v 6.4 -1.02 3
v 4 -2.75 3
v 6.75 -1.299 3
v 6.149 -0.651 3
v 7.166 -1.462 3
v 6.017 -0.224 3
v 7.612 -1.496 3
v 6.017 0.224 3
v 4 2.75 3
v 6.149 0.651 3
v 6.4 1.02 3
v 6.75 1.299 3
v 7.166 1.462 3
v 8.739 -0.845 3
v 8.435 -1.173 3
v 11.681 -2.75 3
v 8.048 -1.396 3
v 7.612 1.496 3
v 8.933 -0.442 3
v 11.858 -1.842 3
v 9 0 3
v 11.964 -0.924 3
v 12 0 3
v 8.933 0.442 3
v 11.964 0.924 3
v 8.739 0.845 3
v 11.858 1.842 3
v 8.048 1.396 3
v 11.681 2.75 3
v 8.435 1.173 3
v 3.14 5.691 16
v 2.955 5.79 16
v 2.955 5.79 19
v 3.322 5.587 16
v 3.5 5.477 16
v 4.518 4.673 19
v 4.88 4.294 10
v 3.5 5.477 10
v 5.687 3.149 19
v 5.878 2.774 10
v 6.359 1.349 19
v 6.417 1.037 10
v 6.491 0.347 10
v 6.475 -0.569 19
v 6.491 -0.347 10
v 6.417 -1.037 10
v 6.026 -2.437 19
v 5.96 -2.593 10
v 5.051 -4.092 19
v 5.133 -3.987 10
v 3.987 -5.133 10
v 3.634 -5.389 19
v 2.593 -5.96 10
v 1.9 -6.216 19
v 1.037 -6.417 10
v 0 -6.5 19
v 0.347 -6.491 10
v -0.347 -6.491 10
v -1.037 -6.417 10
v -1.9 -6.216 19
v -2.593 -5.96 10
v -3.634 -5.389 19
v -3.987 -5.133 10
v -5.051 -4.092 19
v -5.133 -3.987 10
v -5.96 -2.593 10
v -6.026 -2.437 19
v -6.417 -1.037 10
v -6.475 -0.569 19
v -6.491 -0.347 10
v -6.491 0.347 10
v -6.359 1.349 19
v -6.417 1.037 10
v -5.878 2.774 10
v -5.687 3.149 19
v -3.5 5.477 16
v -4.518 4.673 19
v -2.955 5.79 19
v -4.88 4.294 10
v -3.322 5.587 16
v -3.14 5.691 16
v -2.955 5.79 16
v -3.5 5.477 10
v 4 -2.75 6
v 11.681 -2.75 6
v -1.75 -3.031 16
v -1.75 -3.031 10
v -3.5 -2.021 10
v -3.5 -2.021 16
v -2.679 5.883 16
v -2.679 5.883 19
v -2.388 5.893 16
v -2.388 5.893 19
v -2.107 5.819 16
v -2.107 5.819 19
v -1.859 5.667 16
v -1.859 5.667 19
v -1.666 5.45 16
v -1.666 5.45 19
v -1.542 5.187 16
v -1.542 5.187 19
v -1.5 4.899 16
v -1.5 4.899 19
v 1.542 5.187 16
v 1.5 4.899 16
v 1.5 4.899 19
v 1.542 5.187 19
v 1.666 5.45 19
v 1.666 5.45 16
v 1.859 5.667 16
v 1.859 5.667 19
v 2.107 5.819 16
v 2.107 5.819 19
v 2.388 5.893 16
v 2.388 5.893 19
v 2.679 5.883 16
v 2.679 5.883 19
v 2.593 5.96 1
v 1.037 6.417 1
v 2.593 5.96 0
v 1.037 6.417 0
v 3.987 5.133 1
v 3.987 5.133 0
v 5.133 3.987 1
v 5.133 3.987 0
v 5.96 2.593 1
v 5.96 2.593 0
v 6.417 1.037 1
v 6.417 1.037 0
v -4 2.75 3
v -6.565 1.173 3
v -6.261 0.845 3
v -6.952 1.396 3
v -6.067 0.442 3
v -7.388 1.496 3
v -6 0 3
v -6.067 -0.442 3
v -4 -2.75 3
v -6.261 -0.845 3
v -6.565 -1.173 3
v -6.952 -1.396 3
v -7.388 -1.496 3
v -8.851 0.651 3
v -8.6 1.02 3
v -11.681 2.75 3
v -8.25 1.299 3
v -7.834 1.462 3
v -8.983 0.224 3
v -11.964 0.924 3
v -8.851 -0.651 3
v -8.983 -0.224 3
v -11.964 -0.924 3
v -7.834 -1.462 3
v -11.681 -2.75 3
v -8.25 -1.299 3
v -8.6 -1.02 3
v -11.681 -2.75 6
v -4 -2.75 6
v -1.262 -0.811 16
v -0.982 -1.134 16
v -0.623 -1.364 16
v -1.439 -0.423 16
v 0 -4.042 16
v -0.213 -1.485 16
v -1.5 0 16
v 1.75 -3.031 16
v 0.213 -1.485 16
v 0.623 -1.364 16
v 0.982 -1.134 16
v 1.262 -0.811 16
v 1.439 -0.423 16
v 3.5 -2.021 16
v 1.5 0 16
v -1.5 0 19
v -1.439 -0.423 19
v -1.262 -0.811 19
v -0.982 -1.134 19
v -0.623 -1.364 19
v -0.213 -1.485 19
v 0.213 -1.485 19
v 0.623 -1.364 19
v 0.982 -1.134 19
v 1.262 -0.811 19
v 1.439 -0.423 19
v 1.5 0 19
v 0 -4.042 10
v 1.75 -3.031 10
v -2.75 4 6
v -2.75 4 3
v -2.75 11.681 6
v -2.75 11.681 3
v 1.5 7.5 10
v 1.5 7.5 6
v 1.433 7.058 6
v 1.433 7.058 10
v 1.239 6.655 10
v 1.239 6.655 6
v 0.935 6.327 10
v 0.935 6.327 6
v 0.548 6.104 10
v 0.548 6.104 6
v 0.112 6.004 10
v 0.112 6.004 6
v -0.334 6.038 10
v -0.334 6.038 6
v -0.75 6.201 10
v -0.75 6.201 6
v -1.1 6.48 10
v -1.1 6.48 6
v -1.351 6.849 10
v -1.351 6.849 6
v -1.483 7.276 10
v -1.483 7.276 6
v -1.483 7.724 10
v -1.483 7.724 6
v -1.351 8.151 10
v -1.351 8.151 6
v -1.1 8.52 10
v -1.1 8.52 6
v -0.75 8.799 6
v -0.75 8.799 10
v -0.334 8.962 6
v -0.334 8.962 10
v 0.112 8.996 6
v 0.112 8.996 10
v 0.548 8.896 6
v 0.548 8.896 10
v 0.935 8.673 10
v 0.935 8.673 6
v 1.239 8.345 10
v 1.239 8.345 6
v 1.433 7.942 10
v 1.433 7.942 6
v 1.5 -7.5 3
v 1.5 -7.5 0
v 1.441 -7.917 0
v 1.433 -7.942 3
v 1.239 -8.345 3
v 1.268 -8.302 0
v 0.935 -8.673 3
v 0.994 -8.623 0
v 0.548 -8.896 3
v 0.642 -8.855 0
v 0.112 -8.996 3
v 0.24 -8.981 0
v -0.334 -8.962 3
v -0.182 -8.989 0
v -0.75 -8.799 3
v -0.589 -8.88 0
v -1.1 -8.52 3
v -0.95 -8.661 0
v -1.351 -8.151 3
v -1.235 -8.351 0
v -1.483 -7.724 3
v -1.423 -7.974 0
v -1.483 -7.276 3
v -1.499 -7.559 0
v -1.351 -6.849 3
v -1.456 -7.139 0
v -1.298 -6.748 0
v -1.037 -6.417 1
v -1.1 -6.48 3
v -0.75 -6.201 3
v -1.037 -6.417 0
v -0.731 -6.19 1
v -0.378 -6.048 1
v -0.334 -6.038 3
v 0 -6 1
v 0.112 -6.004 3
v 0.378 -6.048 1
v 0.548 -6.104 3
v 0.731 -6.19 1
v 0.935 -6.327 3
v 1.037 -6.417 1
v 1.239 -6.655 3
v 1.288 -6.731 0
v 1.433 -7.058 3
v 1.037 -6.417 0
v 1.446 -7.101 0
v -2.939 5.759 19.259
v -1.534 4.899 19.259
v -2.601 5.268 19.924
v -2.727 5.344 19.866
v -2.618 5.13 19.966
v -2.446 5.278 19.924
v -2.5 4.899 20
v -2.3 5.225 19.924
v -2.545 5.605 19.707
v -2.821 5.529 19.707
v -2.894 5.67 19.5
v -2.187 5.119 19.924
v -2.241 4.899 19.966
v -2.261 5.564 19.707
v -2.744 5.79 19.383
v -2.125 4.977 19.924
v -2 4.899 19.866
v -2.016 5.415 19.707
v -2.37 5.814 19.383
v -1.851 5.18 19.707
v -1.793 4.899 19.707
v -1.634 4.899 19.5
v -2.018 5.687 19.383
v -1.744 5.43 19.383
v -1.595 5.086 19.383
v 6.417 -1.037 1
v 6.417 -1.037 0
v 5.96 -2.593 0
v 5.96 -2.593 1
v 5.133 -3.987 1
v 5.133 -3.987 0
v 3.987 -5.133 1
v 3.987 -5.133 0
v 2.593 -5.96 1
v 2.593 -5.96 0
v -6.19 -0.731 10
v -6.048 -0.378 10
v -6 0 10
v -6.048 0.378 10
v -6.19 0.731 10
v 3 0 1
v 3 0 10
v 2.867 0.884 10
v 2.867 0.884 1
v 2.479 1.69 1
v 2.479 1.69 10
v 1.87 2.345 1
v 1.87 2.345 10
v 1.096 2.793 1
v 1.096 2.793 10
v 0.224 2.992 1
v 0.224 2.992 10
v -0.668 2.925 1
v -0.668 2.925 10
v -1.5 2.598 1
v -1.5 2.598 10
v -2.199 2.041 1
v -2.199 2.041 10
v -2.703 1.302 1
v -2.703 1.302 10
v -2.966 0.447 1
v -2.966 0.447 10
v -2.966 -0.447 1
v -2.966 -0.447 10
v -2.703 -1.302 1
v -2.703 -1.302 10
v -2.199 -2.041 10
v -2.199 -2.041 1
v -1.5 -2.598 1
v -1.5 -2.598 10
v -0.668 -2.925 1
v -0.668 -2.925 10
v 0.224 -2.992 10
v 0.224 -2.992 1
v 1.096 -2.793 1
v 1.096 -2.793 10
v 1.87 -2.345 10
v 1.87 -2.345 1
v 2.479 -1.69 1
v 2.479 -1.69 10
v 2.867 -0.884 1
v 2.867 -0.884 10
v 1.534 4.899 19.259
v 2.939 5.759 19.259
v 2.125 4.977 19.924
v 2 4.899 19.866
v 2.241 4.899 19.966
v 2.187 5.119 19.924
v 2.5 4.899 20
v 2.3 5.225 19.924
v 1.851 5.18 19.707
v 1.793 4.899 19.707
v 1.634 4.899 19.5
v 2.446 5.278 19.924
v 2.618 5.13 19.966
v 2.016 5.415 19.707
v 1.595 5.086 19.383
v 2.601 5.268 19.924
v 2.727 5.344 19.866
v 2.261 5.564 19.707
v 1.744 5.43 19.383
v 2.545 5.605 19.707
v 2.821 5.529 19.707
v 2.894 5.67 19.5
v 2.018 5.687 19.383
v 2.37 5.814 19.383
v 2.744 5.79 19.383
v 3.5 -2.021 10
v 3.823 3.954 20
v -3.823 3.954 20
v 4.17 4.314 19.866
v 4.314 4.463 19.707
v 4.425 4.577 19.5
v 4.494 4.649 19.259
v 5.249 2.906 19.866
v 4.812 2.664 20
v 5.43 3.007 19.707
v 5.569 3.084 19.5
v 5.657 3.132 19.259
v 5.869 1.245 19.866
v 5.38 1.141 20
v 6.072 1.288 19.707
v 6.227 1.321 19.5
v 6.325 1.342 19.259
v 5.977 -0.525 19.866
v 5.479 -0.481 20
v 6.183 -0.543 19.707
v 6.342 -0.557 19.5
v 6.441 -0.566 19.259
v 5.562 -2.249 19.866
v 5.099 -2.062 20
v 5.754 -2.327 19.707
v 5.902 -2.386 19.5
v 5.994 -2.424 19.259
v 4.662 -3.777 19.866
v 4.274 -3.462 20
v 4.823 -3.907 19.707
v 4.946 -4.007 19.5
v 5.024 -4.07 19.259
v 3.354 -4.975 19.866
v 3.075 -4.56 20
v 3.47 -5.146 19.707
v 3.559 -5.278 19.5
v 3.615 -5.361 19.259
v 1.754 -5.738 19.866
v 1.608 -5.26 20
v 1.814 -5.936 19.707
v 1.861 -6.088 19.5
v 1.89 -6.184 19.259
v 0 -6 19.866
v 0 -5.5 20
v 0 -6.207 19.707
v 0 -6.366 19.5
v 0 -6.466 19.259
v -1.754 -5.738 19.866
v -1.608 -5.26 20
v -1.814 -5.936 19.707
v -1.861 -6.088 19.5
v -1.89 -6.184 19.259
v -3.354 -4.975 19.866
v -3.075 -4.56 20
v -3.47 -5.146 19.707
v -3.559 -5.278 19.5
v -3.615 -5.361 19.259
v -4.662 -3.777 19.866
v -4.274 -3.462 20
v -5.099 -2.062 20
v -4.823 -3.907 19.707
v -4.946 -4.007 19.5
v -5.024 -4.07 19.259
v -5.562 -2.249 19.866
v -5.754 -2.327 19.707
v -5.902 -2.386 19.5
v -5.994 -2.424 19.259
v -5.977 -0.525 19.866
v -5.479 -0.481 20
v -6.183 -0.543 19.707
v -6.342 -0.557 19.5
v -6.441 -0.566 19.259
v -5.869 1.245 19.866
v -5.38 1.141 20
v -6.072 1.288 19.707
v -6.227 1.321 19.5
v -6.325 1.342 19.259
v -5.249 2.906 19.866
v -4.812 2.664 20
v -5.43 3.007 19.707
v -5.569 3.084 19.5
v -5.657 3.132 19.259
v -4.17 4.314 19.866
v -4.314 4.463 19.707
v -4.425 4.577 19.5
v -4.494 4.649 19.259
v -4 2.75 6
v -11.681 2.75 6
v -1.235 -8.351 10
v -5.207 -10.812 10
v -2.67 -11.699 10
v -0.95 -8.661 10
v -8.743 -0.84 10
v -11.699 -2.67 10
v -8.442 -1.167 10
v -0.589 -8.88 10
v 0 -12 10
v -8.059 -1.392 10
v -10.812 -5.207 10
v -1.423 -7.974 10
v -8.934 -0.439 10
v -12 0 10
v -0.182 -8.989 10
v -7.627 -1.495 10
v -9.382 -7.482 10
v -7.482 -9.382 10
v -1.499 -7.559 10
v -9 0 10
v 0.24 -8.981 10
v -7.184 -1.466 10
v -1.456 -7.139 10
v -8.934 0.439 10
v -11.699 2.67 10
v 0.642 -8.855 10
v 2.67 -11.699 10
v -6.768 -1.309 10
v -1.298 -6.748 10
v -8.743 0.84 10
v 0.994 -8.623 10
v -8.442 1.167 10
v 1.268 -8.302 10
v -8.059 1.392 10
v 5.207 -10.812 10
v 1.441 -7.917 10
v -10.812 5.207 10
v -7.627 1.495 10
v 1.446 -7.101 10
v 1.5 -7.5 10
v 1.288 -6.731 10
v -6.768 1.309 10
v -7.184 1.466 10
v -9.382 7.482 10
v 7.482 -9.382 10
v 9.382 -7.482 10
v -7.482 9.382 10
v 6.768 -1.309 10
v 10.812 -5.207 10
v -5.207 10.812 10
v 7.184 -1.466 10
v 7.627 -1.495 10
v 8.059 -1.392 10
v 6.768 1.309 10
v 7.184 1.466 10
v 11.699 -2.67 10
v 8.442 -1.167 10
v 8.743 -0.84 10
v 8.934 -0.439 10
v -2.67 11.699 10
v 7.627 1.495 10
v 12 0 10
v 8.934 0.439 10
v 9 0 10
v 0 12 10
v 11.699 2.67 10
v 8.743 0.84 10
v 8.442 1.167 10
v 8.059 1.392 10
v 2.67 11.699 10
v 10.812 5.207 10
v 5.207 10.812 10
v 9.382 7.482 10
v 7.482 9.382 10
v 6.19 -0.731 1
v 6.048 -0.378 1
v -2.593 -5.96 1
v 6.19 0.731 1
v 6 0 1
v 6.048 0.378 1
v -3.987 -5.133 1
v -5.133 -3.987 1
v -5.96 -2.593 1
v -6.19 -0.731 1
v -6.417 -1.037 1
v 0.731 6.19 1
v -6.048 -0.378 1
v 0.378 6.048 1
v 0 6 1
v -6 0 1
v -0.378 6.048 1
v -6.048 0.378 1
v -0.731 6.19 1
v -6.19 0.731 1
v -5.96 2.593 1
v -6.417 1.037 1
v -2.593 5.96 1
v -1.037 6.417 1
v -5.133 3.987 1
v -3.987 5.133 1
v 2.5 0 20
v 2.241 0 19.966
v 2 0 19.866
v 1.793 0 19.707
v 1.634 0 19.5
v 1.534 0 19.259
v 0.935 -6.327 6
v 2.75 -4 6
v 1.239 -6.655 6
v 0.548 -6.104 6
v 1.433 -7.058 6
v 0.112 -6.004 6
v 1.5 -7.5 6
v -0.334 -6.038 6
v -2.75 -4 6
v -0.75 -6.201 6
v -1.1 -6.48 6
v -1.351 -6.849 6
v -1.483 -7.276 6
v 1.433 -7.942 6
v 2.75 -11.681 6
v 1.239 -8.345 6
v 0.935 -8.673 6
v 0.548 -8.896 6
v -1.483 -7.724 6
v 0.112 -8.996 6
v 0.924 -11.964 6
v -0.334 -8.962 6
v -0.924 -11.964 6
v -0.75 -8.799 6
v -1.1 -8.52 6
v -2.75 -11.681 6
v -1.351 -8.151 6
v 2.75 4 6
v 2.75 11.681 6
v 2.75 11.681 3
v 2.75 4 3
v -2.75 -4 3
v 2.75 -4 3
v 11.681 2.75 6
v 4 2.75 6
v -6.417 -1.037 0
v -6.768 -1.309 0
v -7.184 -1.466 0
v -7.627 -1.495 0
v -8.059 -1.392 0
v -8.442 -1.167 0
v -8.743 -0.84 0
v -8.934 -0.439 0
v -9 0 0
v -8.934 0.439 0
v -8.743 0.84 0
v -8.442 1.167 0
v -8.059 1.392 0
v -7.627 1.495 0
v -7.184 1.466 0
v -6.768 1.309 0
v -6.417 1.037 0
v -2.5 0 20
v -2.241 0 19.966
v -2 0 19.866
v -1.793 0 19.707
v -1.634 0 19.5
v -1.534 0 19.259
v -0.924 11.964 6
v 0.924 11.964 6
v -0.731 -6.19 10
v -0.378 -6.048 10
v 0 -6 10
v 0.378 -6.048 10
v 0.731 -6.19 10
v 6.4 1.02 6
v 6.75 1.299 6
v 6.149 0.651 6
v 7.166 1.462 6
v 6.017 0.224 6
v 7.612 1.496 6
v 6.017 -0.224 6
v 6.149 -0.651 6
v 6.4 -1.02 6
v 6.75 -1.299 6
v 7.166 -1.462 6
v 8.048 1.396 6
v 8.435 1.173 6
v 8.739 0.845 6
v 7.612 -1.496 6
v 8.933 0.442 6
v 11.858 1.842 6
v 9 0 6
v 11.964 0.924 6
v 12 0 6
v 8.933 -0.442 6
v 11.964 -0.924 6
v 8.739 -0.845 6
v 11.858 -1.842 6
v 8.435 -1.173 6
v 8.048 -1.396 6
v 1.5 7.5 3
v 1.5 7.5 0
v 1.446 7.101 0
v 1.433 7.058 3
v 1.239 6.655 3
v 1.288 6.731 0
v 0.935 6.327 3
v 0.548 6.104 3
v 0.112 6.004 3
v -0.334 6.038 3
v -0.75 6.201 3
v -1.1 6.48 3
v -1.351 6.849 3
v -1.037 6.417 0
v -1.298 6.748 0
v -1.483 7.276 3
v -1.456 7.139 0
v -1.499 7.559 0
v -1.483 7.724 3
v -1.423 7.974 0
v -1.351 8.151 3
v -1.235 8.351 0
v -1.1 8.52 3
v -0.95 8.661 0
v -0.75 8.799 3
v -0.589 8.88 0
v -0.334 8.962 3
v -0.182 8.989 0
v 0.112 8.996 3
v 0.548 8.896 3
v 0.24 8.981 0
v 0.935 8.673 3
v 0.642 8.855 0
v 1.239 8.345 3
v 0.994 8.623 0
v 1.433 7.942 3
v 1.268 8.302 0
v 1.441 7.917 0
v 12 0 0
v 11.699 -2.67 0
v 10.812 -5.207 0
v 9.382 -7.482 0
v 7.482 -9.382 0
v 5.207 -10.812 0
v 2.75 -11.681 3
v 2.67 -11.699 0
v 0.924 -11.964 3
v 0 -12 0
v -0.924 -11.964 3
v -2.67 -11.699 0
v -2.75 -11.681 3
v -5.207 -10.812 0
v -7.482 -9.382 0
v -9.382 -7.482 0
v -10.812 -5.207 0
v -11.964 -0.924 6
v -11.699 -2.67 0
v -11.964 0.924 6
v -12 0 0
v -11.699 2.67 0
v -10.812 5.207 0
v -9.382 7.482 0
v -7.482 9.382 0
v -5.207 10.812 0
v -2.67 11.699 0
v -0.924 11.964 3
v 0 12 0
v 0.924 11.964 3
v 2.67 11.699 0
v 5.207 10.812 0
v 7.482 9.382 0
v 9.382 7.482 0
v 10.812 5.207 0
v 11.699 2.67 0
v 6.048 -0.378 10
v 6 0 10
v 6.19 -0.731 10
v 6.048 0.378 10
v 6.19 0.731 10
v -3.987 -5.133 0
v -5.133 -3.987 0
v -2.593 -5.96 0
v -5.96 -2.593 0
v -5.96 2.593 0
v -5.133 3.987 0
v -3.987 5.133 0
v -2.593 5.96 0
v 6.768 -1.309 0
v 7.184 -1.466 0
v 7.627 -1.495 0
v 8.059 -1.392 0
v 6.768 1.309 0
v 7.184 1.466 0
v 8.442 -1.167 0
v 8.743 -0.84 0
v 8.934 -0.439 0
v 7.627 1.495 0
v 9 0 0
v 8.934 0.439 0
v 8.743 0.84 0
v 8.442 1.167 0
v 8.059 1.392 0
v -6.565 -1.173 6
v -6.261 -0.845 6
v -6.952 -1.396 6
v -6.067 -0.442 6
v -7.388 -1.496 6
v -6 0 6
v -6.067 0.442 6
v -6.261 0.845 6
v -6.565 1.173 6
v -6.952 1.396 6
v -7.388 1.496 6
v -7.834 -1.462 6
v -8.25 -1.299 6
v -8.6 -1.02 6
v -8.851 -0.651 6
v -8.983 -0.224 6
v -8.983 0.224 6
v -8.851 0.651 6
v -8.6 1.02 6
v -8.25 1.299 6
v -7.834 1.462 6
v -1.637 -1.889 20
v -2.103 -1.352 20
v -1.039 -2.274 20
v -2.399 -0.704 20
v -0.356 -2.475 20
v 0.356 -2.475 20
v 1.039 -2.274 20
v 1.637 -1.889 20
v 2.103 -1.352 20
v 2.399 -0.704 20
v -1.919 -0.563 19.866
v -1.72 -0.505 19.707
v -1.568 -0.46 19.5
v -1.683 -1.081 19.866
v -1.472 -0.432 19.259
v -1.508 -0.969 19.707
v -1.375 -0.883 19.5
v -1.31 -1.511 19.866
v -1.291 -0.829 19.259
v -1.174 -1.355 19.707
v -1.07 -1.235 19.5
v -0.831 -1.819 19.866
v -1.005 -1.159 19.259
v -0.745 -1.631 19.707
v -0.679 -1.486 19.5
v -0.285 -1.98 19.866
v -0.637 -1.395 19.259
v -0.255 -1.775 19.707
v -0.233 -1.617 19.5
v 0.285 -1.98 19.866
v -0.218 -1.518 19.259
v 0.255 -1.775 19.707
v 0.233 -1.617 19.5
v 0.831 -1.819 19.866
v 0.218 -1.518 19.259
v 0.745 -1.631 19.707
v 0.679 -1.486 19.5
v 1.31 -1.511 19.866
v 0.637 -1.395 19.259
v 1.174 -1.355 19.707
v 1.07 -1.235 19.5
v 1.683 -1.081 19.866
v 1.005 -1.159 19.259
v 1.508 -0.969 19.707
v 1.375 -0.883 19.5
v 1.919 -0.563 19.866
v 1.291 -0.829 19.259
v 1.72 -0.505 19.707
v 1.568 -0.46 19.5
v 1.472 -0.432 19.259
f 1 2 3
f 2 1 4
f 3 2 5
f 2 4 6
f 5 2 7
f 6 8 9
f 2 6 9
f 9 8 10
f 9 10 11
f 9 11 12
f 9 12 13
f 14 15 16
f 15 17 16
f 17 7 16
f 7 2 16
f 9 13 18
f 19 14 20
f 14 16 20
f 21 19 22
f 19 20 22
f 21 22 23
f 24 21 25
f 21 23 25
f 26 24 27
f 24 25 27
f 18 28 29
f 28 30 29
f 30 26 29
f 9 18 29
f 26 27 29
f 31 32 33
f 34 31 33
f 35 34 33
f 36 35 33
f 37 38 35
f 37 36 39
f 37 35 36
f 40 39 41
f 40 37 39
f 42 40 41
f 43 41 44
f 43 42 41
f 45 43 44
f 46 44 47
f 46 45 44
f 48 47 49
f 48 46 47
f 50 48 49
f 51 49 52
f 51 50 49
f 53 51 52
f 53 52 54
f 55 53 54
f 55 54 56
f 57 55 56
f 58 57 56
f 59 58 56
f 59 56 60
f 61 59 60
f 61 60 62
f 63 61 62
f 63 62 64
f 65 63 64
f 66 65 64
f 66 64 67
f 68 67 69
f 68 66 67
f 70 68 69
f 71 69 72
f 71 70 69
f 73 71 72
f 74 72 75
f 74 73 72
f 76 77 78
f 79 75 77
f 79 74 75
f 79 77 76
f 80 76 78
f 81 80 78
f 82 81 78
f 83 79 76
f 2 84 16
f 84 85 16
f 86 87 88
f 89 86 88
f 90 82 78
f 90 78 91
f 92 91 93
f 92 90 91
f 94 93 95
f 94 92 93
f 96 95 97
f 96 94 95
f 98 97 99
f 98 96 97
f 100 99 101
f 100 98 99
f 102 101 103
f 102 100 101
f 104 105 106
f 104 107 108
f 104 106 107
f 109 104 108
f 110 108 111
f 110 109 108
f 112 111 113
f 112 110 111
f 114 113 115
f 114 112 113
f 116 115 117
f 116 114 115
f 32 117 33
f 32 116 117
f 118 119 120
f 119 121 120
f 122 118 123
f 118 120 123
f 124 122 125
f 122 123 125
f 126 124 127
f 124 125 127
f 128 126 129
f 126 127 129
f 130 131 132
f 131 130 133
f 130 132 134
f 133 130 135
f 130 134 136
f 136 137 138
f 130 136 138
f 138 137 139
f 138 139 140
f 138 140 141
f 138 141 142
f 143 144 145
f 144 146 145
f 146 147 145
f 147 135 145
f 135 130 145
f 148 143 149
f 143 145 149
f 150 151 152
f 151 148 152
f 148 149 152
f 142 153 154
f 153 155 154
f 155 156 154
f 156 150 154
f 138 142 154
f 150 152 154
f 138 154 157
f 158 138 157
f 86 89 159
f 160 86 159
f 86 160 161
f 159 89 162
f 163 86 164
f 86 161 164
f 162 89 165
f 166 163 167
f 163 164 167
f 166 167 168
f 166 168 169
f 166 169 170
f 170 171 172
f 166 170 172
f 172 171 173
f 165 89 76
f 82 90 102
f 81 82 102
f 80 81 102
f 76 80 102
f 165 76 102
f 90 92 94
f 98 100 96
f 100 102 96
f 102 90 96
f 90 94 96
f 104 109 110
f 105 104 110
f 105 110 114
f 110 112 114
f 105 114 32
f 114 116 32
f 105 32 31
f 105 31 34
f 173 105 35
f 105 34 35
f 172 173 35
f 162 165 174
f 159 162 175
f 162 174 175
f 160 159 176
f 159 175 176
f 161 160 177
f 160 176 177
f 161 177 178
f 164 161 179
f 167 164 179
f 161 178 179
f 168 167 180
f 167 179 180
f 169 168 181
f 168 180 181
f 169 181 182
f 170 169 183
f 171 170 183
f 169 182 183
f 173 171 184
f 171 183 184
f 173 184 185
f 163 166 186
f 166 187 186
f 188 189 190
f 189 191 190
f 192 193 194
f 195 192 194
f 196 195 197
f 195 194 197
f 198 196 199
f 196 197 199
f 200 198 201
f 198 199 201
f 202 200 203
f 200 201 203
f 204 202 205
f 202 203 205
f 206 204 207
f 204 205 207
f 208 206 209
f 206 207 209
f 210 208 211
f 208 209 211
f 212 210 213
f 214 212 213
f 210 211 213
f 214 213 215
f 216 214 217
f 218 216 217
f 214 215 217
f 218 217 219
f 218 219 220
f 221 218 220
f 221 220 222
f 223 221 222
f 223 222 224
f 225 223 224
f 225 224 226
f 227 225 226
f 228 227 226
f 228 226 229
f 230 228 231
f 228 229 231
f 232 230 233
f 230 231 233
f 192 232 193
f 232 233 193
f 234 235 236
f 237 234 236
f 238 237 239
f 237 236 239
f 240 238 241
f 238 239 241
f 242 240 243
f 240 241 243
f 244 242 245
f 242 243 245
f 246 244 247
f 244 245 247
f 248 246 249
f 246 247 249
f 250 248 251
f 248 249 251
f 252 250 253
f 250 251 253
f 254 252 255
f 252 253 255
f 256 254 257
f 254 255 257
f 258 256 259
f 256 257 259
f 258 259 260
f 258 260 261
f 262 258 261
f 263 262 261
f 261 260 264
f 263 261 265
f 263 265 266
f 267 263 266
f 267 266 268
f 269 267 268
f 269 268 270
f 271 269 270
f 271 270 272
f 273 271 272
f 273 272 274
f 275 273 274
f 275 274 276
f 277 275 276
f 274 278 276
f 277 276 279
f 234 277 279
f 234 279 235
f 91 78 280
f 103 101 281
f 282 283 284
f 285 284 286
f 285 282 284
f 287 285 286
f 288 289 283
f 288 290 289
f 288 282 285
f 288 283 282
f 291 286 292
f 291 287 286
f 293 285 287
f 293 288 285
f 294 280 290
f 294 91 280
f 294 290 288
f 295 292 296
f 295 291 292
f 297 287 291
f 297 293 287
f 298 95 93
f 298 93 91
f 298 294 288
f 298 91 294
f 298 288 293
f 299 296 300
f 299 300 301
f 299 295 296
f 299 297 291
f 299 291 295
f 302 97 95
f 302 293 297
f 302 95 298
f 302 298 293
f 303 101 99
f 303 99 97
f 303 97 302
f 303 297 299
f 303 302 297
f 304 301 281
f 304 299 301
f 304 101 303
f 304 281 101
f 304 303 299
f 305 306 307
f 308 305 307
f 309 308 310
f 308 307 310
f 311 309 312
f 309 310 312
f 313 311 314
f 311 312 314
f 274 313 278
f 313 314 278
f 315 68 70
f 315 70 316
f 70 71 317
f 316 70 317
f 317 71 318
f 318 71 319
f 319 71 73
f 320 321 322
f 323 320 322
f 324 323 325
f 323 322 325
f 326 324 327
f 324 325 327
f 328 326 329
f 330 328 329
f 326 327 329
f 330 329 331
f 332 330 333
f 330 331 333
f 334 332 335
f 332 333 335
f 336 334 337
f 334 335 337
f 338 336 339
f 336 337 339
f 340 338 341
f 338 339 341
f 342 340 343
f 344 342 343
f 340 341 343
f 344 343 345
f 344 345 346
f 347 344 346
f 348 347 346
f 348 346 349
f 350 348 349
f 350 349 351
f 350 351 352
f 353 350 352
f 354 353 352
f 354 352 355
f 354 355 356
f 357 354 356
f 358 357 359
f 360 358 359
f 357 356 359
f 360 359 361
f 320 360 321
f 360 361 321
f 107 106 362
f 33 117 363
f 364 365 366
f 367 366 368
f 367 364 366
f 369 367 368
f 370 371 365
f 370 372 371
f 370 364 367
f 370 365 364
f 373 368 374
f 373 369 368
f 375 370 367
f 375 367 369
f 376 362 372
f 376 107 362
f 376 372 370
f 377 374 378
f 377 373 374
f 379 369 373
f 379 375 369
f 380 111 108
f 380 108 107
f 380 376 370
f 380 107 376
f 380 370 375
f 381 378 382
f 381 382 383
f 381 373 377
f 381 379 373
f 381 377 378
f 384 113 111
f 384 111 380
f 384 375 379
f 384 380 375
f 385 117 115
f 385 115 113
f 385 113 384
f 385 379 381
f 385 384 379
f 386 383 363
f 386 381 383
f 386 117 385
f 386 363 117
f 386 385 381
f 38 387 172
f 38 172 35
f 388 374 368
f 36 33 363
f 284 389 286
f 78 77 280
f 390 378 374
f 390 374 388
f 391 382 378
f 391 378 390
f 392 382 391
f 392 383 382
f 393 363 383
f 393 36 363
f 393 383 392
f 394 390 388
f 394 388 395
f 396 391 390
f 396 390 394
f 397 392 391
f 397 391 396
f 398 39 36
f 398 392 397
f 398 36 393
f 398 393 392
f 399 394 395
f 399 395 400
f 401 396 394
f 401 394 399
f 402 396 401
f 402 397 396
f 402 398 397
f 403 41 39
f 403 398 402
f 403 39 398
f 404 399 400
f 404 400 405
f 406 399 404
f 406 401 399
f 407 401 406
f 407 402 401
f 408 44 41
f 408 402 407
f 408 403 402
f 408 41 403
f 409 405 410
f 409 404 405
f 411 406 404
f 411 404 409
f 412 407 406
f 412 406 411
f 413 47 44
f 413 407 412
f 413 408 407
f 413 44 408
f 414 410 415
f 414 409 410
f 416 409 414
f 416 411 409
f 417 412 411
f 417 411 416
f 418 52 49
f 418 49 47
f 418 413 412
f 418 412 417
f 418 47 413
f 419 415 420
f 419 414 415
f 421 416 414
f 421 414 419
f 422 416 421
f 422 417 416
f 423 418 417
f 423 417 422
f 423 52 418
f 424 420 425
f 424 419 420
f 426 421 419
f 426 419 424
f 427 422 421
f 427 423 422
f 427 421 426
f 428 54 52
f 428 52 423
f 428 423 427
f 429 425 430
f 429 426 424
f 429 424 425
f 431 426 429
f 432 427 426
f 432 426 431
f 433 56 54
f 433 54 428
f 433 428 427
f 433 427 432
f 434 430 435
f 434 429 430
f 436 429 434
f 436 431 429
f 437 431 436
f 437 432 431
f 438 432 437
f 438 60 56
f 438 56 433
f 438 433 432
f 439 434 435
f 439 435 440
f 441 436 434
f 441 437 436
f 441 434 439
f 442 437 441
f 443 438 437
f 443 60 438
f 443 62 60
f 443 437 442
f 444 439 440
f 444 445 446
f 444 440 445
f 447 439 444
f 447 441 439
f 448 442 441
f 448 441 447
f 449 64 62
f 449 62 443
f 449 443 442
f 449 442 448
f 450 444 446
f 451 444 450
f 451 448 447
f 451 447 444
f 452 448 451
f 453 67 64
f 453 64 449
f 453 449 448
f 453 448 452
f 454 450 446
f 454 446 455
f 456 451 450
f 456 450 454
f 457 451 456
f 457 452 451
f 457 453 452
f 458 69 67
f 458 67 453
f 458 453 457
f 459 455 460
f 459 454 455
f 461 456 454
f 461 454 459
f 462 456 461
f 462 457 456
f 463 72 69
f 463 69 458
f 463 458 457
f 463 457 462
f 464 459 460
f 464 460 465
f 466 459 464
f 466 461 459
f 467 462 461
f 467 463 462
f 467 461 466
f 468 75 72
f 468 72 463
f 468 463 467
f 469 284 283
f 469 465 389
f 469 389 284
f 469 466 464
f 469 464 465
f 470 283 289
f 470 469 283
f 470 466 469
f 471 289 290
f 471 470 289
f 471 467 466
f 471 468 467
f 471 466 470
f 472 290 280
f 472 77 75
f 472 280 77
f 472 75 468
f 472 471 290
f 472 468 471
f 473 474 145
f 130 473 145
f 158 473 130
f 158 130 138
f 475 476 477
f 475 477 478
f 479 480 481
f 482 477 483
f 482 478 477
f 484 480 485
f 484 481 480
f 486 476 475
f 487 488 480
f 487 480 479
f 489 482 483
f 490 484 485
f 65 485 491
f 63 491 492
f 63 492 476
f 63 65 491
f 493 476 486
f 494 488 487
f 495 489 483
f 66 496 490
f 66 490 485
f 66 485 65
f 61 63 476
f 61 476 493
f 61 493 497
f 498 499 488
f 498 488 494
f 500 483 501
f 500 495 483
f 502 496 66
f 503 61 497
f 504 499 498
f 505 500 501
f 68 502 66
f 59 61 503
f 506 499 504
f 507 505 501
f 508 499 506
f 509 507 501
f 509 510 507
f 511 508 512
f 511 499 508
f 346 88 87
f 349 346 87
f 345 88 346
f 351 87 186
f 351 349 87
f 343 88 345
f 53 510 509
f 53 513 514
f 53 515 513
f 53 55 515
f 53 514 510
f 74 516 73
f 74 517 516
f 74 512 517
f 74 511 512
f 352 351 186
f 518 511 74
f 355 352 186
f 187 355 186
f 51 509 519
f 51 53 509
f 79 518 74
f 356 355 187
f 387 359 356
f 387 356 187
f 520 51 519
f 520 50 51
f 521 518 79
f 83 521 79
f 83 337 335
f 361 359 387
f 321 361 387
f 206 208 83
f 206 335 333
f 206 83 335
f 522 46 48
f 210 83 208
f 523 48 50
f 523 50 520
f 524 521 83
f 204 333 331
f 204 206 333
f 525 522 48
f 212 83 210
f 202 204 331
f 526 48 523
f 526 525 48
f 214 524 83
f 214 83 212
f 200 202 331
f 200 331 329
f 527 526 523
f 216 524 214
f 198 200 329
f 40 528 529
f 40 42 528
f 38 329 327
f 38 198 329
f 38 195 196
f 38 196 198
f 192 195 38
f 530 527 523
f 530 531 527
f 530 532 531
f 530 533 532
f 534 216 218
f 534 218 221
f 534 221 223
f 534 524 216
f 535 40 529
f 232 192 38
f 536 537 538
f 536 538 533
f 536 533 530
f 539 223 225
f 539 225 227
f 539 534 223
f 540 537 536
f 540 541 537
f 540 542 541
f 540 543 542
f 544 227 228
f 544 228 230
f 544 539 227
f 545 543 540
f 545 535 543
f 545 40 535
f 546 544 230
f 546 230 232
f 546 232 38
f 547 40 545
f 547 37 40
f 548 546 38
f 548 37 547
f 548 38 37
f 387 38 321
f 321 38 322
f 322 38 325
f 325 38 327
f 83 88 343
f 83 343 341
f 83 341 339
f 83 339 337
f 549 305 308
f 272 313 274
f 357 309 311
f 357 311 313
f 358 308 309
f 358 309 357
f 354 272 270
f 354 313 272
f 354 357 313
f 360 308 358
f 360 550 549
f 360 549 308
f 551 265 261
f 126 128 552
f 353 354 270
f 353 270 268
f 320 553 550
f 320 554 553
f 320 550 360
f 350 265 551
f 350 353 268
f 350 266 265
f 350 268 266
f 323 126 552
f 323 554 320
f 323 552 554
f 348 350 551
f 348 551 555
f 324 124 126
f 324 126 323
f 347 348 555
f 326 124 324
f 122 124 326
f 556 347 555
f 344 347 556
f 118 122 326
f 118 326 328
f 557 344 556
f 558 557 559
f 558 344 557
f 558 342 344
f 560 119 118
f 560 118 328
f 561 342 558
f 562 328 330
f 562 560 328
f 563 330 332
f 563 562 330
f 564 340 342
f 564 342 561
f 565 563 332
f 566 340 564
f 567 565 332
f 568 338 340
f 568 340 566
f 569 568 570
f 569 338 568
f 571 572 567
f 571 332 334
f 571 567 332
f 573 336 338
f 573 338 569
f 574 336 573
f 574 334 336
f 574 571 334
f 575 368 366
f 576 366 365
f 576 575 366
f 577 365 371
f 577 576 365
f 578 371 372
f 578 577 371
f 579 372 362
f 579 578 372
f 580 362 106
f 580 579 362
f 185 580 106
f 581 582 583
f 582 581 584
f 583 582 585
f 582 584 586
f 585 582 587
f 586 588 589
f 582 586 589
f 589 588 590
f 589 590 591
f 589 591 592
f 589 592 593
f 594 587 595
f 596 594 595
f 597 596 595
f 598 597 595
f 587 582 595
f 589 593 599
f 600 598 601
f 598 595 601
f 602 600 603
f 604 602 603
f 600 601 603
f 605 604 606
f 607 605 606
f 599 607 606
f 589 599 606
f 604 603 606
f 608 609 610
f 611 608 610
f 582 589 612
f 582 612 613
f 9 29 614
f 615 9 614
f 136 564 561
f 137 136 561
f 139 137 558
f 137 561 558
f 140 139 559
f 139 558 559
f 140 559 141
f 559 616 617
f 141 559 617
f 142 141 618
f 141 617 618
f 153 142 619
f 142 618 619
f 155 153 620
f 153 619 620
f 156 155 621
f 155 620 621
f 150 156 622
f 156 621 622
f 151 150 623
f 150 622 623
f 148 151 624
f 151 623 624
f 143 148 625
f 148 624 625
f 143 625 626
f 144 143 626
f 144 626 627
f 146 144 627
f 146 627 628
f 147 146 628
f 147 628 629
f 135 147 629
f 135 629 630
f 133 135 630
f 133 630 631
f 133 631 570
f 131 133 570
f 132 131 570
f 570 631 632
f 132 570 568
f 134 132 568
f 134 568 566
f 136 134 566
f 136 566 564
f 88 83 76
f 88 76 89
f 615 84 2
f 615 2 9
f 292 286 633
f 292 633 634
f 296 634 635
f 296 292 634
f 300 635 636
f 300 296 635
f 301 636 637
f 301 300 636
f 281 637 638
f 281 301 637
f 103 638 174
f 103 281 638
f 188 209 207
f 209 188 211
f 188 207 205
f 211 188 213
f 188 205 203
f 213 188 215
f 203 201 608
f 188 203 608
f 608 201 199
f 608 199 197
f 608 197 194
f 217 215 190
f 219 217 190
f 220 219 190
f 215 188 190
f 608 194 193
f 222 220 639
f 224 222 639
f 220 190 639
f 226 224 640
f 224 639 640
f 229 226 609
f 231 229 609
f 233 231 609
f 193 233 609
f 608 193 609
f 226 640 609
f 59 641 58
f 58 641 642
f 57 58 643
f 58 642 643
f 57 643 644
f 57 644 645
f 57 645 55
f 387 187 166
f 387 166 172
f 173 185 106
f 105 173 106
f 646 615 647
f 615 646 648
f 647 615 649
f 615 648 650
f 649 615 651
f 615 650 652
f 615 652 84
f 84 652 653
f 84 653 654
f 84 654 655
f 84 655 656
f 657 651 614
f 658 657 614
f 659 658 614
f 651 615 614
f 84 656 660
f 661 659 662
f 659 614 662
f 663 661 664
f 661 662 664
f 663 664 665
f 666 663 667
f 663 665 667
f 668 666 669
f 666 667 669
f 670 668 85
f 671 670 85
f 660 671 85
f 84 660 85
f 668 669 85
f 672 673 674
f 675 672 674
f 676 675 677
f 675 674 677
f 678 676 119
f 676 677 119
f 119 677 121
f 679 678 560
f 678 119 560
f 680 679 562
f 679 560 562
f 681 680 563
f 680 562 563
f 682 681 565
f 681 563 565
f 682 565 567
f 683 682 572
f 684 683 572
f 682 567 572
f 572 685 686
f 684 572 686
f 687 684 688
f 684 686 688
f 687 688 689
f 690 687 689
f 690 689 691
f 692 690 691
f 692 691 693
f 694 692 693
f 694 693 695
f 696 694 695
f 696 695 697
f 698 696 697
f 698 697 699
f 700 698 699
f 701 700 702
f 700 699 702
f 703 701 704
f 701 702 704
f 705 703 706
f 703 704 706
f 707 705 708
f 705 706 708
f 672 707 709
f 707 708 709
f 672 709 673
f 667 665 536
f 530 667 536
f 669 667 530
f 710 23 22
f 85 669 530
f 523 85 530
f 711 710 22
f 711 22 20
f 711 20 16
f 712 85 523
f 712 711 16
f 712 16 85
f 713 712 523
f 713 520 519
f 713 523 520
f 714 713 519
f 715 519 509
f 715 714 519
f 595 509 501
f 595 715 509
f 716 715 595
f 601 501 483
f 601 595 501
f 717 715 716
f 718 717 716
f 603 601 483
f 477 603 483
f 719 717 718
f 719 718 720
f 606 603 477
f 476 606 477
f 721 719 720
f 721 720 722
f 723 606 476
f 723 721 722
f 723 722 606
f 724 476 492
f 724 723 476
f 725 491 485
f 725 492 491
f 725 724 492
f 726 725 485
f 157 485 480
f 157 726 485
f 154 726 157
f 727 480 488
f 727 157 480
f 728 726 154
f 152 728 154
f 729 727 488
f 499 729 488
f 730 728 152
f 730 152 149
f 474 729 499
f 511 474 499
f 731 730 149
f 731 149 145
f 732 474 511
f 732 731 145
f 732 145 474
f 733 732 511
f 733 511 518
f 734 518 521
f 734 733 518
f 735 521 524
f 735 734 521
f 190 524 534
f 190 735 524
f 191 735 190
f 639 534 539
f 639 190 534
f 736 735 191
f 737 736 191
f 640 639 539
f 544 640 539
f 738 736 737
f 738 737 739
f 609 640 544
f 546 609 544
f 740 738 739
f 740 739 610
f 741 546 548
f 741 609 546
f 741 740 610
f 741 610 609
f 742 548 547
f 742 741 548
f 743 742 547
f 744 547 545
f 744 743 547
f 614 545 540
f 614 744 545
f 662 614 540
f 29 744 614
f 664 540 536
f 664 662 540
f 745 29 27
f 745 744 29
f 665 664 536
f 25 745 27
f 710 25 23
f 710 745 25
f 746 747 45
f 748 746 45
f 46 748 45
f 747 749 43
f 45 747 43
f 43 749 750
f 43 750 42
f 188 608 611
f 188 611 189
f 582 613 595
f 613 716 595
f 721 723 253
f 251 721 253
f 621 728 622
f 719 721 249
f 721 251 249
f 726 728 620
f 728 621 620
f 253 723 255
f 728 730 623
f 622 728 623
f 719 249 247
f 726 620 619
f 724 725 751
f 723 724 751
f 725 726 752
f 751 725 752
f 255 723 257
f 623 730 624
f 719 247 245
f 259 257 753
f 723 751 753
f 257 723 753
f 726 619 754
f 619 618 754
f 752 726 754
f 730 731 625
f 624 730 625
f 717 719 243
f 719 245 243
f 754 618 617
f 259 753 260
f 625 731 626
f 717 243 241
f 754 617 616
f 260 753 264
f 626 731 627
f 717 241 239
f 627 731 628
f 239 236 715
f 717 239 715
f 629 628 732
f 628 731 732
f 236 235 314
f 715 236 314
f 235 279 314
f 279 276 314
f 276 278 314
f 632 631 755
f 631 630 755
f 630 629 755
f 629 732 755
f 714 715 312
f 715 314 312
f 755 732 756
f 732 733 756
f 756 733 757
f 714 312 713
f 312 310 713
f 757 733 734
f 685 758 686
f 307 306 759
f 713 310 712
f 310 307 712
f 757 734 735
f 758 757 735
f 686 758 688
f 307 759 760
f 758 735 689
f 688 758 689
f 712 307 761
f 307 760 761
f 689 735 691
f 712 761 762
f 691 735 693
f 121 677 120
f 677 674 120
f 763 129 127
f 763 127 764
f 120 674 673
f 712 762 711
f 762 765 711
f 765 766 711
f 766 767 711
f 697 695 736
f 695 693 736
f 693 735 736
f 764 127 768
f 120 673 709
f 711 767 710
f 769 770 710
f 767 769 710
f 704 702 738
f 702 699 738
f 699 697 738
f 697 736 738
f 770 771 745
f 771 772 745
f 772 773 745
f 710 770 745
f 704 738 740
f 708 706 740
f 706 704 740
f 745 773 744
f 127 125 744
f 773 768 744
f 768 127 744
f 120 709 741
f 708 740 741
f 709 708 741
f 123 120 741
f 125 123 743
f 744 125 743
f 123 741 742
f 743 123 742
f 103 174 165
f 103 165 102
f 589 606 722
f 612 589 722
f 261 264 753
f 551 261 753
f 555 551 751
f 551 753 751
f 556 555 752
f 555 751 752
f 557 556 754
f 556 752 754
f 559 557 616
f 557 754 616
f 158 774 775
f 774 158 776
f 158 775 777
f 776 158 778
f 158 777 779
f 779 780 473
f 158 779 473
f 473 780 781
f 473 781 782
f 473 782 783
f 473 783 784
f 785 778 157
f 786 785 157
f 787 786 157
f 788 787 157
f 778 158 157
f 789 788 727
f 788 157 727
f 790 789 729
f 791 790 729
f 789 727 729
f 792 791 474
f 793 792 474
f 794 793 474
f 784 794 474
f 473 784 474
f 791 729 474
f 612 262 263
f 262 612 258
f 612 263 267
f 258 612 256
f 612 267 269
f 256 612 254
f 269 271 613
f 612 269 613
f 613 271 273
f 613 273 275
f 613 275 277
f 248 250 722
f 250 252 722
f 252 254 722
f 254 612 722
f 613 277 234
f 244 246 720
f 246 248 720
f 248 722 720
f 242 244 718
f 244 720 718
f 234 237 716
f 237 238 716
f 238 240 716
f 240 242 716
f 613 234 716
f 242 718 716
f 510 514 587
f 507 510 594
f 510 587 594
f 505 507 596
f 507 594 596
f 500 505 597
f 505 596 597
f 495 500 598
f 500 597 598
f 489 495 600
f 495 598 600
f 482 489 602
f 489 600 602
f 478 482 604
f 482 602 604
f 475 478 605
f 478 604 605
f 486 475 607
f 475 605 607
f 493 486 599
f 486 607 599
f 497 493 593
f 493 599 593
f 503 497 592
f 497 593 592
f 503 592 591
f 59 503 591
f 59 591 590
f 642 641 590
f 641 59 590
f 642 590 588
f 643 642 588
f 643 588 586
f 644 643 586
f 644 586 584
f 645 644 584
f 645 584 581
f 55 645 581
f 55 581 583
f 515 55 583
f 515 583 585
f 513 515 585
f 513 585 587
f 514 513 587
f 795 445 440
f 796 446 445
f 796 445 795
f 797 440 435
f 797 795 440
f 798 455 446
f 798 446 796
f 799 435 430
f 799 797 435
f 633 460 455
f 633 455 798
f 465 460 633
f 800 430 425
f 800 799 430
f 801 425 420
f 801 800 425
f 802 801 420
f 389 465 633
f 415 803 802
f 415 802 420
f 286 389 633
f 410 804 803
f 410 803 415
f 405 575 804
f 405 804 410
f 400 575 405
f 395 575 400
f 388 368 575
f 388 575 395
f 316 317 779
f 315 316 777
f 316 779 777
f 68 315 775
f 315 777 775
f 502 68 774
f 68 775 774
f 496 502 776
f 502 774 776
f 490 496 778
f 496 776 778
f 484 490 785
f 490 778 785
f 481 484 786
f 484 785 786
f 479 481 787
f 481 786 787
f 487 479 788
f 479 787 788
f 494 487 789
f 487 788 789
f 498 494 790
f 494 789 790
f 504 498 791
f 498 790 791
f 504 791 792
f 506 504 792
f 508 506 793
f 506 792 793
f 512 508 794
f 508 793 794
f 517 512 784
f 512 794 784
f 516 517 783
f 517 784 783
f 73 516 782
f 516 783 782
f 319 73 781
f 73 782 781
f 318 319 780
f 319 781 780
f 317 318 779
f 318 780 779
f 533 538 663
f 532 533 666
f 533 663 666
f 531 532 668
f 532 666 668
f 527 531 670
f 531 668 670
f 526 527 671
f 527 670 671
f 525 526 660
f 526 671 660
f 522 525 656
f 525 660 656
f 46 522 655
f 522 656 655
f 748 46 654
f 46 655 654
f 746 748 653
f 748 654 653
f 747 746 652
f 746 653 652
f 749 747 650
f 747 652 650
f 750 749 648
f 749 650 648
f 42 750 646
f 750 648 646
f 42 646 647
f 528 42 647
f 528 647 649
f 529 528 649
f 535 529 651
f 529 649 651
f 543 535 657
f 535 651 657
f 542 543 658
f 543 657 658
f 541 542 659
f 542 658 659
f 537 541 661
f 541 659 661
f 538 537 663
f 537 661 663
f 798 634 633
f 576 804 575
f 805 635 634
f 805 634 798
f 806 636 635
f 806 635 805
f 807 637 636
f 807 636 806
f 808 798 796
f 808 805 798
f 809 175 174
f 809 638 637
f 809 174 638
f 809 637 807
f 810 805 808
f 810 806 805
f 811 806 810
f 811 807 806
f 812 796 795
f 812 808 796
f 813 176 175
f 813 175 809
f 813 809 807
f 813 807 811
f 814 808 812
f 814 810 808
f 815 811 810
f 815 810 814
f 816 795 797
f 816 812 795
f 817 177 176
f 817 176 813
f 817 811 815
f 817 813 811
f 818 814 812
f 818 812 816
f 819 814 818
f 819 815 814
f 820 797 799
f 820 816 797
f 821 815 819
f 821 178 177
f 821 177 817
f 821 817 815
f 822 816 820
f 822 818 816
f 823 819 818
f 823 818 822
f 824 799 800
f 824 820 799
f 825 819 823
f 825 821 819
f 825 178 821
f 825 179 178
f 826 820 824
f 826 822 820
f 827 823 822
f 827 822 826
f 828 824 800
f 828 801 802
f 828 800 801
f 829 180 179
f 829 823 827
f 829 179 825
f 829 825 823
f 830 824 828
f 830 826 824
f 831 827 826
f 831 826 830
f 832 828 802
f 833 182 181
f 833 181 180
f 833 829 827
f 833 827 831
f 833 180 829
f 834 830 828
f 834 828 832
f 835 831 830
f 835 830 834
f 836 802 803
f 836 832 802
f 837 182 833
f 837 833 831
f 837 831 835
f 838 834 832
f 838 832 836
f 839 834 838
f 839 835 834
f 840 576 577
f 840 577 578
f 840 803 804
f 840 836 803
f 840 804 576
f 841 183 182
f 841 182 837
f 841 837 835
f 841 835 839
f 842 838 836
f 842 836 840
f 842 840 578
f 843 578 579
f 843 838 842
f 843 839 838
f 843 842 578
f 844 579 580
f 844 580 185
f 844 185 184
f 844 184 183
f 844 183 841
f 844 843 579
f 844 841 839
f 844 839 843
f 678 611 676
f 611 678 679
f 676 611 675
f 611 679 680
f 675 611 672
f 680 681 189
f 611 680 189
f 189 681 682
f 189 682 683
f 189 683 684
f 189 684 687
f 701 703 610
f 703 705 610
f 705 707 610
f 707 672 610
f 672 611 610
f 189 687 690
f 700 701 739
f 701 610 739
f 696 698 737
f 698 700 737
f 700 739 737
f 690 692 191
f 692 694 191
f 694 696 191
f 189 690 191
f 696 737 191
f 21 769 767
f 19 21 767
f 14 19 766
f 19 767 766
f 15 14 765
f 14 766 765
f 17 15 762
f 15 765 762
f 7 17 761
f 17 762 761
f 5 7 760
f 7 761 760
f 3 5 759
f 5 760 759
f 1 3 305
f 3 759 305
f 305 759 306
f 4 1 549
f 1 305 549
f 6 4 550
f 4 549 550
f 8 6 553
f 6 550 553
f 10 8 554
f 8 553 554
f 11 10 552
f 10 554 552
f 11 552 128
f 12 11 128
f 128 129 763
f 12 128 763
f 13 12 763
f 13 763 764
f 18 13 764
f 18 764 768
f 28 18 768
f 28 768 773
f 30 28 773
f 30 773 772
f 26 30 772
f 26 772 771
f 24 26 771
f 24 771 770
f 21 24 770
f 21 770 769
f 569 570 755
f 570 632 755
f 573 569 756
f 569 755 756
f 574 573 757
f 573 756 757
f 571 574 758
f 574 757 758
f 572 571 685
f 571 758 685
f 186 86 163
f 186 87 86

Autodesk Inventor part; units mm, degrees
ref_plane "YZ Plane" through (0, 0, 0) normal (1, 0, 0) x (0, 1, 0)
ref_plane "XY Plane" through (0, 0, 0) normal (0, 0, 1) x (1, 0, 0)
sketch "Sketch1" plane through (0, 0, 0) normal (0, 0, 1) x (1, 0, 0)
  line L0 (0, 0) -> (0, 7.5)
  circle A0 centre (0, 7.5) radius 1.5
  circle A1 centre (-5.3033, 5.3033) radius 1.5
  circle A2 centre (-7.5, 0) radius 1.5
  circle A3 centre (-5.3033, -5.3033) radius 1.5
  circle A4 centre (0, -7.5) radius 1.5
  circle A5 centre (5.3033, -5.3033) radius 1.5
  circle A6 centre (7.5, 0) radius 1.5
  circle A7 centre (5.3033, 5.3033) radius 1.5
  circle A8 centre (0, 0) radius 12
  dimension "d0" = 7.5
  dimension "d1" = 3
  dimension "d4" = 360
  dimension "d6" = 24
extrude "Extrusion1" add sketch "Sketch1" along normal blind 10 contours A1 | A3 | A5 | A7 | A8
sketch "Sketch2" plane through (0, 0, 0) normal (0, 0, -1) x (-1, 0, 0)
  circle A0 centre (0, 0) radius 6.5
  dimension "d9" = 13
extrude "Extrusion2" cut sketch "Sketch2" against normal blind 1
sketch "Sketch3" plane through (0, 0, 10) normal (0, 0, 1) x (1, 0, 0)
  circle A0 centre (0, 0) radius 6.5
  dimension "d12" = 13
extrude "Extrusion3" add sketch "Sketch3" along normal blind 10
sketch "Sketch4" plane through (0, 0, 10) normal (0, 0, 1) x (1, 0, 0)
  line L0 (0, 0) -> (-6.5, 0)
  circle A0 centre (0, 0) radius 6.5 projected
  line L1 (0, 0) -> (-3.5, 0)
  line L2 (-3.5, 0) -> (3.5, 0)
  line L3 (3.5, 0) -> (3.5, -3)
  line L4 (1.75, 3.0311) -> (4.3481, 1.5311)
  line L5 (-1.75, 3.0311) -> (0.8481, 4.5311)
  line L6 (-3.5, 0) -> (-3.5, 3)
  line L7 (-1.75, -3.0311) -> (-4.3481, -1.5311)
  line L8 (1.75, -3.0311) -> (-0.8481, -4.5311)
  line L9 (0, 0) -> (0, -4.0415)
  line L10 (0, 0) -> (0, 4.0415)
  line L11 (3.5, 0) -> (3.5, 2.0207)
  line L12 (0, 4.0415) -> (1.75, 3.0311)
  line L13 (-1.75, 3.0311) -> (-3.5, 2.0207)
  line L14 (-3.5, 0) -> (-3.5, -2.0207)
  line L15 (-1.75, -3.0311) -> (0, -4.0415)
  line L16 (1.75, -3.0311) -> (3.5, -2.0207)
  line L17 (3.5, 2.0207) -> (3.5, 7.0207)
  line L18 (3.5, 7.0207) -> (-3.5, 7.0207)
  line L19 (-3.5, 7.0207) -> (-3.5, 3)
  dimension "d15" = 3.5
  dimension "d16" = 7
  dimension "d17" = 3
  dimension "d20" = 360
  dimension "d22" = 5
extrude "Extrusion4" cut sketch "Sketch4" along normal blind 6 contours L9 L15 L7 L14 L0 | L10 L12 L4 L11 L2 | L2 L3 L16 L8 L9 | L0 L6 L13 L5 L10 | L5 L13 L6 L19 A0 L17 L4 L12 | L19 L18 L17 A0
sketch "Sketch5" plane through (0, 0, 20) normal (0, 0, 1) x (1, 0, 0)
  circle A0 centre (0, 0) radius 1.5
  dimension "d25" = 3
extrude "Extrusion5" cut sketch "Sketch5" against normal up to surface (19 mm away)
sketch "Sketch6" plane through (0, 0, 20) normal (0, 0, 1) x (1, 0, 0)
  circle A0 centre (0, 0) radius 1.5 projected
  line L0 (1.5, 0) -> (1.5, 15)
  line L1 (1.5, 0) -> (-1.5, 0)
  line L2 (-1.5, 0) -> (-1.5, 15)
  line L3 (-1.5, 15) -> (1.5, 15)
  dimension "d28" = 15
  dimension "d29" = 15
extrude "Extrusion6" cut sketch "Sketch6" against normal up to surface (4 mm away) contours A0 L2 L3 L0
fillet "Fillet1" radius 1 2 edges at (1.5, 6.3246, 18) (-1.5, 6.3246, 18)
fillet "Fillet2" radius 1 6 edges at (1.9778, 5.7518, 20) (1.5, 2.4495, 20) (0, -1.5, 20) (-1.5, 2.4495, 20) (-1.9778, 5.7518, 20) (0, -6.5, 20)
ref_plane "Work Plane1" through (0, 12, 0) normal (0, 1, 0) x (-1, 0, 0)
sketch "Sketch7" plane through (0, 12, 0) normal (0, 1, 0) x (-1, 0, 0)
  line L0 (0, 0) -> (0, 3)
  line L1 (0, 3) -> (2.75, 3)
  line L2 (2.75, 3) -> (2.75, 6)
  line L3 (2.75, 6) -> (-2.75, 6)
  line L4 (-2.75, 6) -> (-2.75, 3)
  line L5 (-2.75, 3) -> (0, 3)
  dimension "d35" = 3
  dimension "d36" = 2.75
  dimension "d37" = 3
  dimension "d38" = 5.5
extrude "Extrusion7" cut sketch "Sketch7" against normal blind 8
pattern_circular "Circular Pattern1" count 4 over 360 about axis through (0, 0, 20) along (0, 0, -1) of "Extrusion7"
sketch "Sketch8" plane through (0, 0, 10) normal (0, 0, 1) x (1, 0, 0)
  circle A0 centre (0, 0) radius 3
  dimension "d44" = 6
extrude "Extrusion8" cut sketch "Sketch8" against normal through all
properties part number "screwServo"
